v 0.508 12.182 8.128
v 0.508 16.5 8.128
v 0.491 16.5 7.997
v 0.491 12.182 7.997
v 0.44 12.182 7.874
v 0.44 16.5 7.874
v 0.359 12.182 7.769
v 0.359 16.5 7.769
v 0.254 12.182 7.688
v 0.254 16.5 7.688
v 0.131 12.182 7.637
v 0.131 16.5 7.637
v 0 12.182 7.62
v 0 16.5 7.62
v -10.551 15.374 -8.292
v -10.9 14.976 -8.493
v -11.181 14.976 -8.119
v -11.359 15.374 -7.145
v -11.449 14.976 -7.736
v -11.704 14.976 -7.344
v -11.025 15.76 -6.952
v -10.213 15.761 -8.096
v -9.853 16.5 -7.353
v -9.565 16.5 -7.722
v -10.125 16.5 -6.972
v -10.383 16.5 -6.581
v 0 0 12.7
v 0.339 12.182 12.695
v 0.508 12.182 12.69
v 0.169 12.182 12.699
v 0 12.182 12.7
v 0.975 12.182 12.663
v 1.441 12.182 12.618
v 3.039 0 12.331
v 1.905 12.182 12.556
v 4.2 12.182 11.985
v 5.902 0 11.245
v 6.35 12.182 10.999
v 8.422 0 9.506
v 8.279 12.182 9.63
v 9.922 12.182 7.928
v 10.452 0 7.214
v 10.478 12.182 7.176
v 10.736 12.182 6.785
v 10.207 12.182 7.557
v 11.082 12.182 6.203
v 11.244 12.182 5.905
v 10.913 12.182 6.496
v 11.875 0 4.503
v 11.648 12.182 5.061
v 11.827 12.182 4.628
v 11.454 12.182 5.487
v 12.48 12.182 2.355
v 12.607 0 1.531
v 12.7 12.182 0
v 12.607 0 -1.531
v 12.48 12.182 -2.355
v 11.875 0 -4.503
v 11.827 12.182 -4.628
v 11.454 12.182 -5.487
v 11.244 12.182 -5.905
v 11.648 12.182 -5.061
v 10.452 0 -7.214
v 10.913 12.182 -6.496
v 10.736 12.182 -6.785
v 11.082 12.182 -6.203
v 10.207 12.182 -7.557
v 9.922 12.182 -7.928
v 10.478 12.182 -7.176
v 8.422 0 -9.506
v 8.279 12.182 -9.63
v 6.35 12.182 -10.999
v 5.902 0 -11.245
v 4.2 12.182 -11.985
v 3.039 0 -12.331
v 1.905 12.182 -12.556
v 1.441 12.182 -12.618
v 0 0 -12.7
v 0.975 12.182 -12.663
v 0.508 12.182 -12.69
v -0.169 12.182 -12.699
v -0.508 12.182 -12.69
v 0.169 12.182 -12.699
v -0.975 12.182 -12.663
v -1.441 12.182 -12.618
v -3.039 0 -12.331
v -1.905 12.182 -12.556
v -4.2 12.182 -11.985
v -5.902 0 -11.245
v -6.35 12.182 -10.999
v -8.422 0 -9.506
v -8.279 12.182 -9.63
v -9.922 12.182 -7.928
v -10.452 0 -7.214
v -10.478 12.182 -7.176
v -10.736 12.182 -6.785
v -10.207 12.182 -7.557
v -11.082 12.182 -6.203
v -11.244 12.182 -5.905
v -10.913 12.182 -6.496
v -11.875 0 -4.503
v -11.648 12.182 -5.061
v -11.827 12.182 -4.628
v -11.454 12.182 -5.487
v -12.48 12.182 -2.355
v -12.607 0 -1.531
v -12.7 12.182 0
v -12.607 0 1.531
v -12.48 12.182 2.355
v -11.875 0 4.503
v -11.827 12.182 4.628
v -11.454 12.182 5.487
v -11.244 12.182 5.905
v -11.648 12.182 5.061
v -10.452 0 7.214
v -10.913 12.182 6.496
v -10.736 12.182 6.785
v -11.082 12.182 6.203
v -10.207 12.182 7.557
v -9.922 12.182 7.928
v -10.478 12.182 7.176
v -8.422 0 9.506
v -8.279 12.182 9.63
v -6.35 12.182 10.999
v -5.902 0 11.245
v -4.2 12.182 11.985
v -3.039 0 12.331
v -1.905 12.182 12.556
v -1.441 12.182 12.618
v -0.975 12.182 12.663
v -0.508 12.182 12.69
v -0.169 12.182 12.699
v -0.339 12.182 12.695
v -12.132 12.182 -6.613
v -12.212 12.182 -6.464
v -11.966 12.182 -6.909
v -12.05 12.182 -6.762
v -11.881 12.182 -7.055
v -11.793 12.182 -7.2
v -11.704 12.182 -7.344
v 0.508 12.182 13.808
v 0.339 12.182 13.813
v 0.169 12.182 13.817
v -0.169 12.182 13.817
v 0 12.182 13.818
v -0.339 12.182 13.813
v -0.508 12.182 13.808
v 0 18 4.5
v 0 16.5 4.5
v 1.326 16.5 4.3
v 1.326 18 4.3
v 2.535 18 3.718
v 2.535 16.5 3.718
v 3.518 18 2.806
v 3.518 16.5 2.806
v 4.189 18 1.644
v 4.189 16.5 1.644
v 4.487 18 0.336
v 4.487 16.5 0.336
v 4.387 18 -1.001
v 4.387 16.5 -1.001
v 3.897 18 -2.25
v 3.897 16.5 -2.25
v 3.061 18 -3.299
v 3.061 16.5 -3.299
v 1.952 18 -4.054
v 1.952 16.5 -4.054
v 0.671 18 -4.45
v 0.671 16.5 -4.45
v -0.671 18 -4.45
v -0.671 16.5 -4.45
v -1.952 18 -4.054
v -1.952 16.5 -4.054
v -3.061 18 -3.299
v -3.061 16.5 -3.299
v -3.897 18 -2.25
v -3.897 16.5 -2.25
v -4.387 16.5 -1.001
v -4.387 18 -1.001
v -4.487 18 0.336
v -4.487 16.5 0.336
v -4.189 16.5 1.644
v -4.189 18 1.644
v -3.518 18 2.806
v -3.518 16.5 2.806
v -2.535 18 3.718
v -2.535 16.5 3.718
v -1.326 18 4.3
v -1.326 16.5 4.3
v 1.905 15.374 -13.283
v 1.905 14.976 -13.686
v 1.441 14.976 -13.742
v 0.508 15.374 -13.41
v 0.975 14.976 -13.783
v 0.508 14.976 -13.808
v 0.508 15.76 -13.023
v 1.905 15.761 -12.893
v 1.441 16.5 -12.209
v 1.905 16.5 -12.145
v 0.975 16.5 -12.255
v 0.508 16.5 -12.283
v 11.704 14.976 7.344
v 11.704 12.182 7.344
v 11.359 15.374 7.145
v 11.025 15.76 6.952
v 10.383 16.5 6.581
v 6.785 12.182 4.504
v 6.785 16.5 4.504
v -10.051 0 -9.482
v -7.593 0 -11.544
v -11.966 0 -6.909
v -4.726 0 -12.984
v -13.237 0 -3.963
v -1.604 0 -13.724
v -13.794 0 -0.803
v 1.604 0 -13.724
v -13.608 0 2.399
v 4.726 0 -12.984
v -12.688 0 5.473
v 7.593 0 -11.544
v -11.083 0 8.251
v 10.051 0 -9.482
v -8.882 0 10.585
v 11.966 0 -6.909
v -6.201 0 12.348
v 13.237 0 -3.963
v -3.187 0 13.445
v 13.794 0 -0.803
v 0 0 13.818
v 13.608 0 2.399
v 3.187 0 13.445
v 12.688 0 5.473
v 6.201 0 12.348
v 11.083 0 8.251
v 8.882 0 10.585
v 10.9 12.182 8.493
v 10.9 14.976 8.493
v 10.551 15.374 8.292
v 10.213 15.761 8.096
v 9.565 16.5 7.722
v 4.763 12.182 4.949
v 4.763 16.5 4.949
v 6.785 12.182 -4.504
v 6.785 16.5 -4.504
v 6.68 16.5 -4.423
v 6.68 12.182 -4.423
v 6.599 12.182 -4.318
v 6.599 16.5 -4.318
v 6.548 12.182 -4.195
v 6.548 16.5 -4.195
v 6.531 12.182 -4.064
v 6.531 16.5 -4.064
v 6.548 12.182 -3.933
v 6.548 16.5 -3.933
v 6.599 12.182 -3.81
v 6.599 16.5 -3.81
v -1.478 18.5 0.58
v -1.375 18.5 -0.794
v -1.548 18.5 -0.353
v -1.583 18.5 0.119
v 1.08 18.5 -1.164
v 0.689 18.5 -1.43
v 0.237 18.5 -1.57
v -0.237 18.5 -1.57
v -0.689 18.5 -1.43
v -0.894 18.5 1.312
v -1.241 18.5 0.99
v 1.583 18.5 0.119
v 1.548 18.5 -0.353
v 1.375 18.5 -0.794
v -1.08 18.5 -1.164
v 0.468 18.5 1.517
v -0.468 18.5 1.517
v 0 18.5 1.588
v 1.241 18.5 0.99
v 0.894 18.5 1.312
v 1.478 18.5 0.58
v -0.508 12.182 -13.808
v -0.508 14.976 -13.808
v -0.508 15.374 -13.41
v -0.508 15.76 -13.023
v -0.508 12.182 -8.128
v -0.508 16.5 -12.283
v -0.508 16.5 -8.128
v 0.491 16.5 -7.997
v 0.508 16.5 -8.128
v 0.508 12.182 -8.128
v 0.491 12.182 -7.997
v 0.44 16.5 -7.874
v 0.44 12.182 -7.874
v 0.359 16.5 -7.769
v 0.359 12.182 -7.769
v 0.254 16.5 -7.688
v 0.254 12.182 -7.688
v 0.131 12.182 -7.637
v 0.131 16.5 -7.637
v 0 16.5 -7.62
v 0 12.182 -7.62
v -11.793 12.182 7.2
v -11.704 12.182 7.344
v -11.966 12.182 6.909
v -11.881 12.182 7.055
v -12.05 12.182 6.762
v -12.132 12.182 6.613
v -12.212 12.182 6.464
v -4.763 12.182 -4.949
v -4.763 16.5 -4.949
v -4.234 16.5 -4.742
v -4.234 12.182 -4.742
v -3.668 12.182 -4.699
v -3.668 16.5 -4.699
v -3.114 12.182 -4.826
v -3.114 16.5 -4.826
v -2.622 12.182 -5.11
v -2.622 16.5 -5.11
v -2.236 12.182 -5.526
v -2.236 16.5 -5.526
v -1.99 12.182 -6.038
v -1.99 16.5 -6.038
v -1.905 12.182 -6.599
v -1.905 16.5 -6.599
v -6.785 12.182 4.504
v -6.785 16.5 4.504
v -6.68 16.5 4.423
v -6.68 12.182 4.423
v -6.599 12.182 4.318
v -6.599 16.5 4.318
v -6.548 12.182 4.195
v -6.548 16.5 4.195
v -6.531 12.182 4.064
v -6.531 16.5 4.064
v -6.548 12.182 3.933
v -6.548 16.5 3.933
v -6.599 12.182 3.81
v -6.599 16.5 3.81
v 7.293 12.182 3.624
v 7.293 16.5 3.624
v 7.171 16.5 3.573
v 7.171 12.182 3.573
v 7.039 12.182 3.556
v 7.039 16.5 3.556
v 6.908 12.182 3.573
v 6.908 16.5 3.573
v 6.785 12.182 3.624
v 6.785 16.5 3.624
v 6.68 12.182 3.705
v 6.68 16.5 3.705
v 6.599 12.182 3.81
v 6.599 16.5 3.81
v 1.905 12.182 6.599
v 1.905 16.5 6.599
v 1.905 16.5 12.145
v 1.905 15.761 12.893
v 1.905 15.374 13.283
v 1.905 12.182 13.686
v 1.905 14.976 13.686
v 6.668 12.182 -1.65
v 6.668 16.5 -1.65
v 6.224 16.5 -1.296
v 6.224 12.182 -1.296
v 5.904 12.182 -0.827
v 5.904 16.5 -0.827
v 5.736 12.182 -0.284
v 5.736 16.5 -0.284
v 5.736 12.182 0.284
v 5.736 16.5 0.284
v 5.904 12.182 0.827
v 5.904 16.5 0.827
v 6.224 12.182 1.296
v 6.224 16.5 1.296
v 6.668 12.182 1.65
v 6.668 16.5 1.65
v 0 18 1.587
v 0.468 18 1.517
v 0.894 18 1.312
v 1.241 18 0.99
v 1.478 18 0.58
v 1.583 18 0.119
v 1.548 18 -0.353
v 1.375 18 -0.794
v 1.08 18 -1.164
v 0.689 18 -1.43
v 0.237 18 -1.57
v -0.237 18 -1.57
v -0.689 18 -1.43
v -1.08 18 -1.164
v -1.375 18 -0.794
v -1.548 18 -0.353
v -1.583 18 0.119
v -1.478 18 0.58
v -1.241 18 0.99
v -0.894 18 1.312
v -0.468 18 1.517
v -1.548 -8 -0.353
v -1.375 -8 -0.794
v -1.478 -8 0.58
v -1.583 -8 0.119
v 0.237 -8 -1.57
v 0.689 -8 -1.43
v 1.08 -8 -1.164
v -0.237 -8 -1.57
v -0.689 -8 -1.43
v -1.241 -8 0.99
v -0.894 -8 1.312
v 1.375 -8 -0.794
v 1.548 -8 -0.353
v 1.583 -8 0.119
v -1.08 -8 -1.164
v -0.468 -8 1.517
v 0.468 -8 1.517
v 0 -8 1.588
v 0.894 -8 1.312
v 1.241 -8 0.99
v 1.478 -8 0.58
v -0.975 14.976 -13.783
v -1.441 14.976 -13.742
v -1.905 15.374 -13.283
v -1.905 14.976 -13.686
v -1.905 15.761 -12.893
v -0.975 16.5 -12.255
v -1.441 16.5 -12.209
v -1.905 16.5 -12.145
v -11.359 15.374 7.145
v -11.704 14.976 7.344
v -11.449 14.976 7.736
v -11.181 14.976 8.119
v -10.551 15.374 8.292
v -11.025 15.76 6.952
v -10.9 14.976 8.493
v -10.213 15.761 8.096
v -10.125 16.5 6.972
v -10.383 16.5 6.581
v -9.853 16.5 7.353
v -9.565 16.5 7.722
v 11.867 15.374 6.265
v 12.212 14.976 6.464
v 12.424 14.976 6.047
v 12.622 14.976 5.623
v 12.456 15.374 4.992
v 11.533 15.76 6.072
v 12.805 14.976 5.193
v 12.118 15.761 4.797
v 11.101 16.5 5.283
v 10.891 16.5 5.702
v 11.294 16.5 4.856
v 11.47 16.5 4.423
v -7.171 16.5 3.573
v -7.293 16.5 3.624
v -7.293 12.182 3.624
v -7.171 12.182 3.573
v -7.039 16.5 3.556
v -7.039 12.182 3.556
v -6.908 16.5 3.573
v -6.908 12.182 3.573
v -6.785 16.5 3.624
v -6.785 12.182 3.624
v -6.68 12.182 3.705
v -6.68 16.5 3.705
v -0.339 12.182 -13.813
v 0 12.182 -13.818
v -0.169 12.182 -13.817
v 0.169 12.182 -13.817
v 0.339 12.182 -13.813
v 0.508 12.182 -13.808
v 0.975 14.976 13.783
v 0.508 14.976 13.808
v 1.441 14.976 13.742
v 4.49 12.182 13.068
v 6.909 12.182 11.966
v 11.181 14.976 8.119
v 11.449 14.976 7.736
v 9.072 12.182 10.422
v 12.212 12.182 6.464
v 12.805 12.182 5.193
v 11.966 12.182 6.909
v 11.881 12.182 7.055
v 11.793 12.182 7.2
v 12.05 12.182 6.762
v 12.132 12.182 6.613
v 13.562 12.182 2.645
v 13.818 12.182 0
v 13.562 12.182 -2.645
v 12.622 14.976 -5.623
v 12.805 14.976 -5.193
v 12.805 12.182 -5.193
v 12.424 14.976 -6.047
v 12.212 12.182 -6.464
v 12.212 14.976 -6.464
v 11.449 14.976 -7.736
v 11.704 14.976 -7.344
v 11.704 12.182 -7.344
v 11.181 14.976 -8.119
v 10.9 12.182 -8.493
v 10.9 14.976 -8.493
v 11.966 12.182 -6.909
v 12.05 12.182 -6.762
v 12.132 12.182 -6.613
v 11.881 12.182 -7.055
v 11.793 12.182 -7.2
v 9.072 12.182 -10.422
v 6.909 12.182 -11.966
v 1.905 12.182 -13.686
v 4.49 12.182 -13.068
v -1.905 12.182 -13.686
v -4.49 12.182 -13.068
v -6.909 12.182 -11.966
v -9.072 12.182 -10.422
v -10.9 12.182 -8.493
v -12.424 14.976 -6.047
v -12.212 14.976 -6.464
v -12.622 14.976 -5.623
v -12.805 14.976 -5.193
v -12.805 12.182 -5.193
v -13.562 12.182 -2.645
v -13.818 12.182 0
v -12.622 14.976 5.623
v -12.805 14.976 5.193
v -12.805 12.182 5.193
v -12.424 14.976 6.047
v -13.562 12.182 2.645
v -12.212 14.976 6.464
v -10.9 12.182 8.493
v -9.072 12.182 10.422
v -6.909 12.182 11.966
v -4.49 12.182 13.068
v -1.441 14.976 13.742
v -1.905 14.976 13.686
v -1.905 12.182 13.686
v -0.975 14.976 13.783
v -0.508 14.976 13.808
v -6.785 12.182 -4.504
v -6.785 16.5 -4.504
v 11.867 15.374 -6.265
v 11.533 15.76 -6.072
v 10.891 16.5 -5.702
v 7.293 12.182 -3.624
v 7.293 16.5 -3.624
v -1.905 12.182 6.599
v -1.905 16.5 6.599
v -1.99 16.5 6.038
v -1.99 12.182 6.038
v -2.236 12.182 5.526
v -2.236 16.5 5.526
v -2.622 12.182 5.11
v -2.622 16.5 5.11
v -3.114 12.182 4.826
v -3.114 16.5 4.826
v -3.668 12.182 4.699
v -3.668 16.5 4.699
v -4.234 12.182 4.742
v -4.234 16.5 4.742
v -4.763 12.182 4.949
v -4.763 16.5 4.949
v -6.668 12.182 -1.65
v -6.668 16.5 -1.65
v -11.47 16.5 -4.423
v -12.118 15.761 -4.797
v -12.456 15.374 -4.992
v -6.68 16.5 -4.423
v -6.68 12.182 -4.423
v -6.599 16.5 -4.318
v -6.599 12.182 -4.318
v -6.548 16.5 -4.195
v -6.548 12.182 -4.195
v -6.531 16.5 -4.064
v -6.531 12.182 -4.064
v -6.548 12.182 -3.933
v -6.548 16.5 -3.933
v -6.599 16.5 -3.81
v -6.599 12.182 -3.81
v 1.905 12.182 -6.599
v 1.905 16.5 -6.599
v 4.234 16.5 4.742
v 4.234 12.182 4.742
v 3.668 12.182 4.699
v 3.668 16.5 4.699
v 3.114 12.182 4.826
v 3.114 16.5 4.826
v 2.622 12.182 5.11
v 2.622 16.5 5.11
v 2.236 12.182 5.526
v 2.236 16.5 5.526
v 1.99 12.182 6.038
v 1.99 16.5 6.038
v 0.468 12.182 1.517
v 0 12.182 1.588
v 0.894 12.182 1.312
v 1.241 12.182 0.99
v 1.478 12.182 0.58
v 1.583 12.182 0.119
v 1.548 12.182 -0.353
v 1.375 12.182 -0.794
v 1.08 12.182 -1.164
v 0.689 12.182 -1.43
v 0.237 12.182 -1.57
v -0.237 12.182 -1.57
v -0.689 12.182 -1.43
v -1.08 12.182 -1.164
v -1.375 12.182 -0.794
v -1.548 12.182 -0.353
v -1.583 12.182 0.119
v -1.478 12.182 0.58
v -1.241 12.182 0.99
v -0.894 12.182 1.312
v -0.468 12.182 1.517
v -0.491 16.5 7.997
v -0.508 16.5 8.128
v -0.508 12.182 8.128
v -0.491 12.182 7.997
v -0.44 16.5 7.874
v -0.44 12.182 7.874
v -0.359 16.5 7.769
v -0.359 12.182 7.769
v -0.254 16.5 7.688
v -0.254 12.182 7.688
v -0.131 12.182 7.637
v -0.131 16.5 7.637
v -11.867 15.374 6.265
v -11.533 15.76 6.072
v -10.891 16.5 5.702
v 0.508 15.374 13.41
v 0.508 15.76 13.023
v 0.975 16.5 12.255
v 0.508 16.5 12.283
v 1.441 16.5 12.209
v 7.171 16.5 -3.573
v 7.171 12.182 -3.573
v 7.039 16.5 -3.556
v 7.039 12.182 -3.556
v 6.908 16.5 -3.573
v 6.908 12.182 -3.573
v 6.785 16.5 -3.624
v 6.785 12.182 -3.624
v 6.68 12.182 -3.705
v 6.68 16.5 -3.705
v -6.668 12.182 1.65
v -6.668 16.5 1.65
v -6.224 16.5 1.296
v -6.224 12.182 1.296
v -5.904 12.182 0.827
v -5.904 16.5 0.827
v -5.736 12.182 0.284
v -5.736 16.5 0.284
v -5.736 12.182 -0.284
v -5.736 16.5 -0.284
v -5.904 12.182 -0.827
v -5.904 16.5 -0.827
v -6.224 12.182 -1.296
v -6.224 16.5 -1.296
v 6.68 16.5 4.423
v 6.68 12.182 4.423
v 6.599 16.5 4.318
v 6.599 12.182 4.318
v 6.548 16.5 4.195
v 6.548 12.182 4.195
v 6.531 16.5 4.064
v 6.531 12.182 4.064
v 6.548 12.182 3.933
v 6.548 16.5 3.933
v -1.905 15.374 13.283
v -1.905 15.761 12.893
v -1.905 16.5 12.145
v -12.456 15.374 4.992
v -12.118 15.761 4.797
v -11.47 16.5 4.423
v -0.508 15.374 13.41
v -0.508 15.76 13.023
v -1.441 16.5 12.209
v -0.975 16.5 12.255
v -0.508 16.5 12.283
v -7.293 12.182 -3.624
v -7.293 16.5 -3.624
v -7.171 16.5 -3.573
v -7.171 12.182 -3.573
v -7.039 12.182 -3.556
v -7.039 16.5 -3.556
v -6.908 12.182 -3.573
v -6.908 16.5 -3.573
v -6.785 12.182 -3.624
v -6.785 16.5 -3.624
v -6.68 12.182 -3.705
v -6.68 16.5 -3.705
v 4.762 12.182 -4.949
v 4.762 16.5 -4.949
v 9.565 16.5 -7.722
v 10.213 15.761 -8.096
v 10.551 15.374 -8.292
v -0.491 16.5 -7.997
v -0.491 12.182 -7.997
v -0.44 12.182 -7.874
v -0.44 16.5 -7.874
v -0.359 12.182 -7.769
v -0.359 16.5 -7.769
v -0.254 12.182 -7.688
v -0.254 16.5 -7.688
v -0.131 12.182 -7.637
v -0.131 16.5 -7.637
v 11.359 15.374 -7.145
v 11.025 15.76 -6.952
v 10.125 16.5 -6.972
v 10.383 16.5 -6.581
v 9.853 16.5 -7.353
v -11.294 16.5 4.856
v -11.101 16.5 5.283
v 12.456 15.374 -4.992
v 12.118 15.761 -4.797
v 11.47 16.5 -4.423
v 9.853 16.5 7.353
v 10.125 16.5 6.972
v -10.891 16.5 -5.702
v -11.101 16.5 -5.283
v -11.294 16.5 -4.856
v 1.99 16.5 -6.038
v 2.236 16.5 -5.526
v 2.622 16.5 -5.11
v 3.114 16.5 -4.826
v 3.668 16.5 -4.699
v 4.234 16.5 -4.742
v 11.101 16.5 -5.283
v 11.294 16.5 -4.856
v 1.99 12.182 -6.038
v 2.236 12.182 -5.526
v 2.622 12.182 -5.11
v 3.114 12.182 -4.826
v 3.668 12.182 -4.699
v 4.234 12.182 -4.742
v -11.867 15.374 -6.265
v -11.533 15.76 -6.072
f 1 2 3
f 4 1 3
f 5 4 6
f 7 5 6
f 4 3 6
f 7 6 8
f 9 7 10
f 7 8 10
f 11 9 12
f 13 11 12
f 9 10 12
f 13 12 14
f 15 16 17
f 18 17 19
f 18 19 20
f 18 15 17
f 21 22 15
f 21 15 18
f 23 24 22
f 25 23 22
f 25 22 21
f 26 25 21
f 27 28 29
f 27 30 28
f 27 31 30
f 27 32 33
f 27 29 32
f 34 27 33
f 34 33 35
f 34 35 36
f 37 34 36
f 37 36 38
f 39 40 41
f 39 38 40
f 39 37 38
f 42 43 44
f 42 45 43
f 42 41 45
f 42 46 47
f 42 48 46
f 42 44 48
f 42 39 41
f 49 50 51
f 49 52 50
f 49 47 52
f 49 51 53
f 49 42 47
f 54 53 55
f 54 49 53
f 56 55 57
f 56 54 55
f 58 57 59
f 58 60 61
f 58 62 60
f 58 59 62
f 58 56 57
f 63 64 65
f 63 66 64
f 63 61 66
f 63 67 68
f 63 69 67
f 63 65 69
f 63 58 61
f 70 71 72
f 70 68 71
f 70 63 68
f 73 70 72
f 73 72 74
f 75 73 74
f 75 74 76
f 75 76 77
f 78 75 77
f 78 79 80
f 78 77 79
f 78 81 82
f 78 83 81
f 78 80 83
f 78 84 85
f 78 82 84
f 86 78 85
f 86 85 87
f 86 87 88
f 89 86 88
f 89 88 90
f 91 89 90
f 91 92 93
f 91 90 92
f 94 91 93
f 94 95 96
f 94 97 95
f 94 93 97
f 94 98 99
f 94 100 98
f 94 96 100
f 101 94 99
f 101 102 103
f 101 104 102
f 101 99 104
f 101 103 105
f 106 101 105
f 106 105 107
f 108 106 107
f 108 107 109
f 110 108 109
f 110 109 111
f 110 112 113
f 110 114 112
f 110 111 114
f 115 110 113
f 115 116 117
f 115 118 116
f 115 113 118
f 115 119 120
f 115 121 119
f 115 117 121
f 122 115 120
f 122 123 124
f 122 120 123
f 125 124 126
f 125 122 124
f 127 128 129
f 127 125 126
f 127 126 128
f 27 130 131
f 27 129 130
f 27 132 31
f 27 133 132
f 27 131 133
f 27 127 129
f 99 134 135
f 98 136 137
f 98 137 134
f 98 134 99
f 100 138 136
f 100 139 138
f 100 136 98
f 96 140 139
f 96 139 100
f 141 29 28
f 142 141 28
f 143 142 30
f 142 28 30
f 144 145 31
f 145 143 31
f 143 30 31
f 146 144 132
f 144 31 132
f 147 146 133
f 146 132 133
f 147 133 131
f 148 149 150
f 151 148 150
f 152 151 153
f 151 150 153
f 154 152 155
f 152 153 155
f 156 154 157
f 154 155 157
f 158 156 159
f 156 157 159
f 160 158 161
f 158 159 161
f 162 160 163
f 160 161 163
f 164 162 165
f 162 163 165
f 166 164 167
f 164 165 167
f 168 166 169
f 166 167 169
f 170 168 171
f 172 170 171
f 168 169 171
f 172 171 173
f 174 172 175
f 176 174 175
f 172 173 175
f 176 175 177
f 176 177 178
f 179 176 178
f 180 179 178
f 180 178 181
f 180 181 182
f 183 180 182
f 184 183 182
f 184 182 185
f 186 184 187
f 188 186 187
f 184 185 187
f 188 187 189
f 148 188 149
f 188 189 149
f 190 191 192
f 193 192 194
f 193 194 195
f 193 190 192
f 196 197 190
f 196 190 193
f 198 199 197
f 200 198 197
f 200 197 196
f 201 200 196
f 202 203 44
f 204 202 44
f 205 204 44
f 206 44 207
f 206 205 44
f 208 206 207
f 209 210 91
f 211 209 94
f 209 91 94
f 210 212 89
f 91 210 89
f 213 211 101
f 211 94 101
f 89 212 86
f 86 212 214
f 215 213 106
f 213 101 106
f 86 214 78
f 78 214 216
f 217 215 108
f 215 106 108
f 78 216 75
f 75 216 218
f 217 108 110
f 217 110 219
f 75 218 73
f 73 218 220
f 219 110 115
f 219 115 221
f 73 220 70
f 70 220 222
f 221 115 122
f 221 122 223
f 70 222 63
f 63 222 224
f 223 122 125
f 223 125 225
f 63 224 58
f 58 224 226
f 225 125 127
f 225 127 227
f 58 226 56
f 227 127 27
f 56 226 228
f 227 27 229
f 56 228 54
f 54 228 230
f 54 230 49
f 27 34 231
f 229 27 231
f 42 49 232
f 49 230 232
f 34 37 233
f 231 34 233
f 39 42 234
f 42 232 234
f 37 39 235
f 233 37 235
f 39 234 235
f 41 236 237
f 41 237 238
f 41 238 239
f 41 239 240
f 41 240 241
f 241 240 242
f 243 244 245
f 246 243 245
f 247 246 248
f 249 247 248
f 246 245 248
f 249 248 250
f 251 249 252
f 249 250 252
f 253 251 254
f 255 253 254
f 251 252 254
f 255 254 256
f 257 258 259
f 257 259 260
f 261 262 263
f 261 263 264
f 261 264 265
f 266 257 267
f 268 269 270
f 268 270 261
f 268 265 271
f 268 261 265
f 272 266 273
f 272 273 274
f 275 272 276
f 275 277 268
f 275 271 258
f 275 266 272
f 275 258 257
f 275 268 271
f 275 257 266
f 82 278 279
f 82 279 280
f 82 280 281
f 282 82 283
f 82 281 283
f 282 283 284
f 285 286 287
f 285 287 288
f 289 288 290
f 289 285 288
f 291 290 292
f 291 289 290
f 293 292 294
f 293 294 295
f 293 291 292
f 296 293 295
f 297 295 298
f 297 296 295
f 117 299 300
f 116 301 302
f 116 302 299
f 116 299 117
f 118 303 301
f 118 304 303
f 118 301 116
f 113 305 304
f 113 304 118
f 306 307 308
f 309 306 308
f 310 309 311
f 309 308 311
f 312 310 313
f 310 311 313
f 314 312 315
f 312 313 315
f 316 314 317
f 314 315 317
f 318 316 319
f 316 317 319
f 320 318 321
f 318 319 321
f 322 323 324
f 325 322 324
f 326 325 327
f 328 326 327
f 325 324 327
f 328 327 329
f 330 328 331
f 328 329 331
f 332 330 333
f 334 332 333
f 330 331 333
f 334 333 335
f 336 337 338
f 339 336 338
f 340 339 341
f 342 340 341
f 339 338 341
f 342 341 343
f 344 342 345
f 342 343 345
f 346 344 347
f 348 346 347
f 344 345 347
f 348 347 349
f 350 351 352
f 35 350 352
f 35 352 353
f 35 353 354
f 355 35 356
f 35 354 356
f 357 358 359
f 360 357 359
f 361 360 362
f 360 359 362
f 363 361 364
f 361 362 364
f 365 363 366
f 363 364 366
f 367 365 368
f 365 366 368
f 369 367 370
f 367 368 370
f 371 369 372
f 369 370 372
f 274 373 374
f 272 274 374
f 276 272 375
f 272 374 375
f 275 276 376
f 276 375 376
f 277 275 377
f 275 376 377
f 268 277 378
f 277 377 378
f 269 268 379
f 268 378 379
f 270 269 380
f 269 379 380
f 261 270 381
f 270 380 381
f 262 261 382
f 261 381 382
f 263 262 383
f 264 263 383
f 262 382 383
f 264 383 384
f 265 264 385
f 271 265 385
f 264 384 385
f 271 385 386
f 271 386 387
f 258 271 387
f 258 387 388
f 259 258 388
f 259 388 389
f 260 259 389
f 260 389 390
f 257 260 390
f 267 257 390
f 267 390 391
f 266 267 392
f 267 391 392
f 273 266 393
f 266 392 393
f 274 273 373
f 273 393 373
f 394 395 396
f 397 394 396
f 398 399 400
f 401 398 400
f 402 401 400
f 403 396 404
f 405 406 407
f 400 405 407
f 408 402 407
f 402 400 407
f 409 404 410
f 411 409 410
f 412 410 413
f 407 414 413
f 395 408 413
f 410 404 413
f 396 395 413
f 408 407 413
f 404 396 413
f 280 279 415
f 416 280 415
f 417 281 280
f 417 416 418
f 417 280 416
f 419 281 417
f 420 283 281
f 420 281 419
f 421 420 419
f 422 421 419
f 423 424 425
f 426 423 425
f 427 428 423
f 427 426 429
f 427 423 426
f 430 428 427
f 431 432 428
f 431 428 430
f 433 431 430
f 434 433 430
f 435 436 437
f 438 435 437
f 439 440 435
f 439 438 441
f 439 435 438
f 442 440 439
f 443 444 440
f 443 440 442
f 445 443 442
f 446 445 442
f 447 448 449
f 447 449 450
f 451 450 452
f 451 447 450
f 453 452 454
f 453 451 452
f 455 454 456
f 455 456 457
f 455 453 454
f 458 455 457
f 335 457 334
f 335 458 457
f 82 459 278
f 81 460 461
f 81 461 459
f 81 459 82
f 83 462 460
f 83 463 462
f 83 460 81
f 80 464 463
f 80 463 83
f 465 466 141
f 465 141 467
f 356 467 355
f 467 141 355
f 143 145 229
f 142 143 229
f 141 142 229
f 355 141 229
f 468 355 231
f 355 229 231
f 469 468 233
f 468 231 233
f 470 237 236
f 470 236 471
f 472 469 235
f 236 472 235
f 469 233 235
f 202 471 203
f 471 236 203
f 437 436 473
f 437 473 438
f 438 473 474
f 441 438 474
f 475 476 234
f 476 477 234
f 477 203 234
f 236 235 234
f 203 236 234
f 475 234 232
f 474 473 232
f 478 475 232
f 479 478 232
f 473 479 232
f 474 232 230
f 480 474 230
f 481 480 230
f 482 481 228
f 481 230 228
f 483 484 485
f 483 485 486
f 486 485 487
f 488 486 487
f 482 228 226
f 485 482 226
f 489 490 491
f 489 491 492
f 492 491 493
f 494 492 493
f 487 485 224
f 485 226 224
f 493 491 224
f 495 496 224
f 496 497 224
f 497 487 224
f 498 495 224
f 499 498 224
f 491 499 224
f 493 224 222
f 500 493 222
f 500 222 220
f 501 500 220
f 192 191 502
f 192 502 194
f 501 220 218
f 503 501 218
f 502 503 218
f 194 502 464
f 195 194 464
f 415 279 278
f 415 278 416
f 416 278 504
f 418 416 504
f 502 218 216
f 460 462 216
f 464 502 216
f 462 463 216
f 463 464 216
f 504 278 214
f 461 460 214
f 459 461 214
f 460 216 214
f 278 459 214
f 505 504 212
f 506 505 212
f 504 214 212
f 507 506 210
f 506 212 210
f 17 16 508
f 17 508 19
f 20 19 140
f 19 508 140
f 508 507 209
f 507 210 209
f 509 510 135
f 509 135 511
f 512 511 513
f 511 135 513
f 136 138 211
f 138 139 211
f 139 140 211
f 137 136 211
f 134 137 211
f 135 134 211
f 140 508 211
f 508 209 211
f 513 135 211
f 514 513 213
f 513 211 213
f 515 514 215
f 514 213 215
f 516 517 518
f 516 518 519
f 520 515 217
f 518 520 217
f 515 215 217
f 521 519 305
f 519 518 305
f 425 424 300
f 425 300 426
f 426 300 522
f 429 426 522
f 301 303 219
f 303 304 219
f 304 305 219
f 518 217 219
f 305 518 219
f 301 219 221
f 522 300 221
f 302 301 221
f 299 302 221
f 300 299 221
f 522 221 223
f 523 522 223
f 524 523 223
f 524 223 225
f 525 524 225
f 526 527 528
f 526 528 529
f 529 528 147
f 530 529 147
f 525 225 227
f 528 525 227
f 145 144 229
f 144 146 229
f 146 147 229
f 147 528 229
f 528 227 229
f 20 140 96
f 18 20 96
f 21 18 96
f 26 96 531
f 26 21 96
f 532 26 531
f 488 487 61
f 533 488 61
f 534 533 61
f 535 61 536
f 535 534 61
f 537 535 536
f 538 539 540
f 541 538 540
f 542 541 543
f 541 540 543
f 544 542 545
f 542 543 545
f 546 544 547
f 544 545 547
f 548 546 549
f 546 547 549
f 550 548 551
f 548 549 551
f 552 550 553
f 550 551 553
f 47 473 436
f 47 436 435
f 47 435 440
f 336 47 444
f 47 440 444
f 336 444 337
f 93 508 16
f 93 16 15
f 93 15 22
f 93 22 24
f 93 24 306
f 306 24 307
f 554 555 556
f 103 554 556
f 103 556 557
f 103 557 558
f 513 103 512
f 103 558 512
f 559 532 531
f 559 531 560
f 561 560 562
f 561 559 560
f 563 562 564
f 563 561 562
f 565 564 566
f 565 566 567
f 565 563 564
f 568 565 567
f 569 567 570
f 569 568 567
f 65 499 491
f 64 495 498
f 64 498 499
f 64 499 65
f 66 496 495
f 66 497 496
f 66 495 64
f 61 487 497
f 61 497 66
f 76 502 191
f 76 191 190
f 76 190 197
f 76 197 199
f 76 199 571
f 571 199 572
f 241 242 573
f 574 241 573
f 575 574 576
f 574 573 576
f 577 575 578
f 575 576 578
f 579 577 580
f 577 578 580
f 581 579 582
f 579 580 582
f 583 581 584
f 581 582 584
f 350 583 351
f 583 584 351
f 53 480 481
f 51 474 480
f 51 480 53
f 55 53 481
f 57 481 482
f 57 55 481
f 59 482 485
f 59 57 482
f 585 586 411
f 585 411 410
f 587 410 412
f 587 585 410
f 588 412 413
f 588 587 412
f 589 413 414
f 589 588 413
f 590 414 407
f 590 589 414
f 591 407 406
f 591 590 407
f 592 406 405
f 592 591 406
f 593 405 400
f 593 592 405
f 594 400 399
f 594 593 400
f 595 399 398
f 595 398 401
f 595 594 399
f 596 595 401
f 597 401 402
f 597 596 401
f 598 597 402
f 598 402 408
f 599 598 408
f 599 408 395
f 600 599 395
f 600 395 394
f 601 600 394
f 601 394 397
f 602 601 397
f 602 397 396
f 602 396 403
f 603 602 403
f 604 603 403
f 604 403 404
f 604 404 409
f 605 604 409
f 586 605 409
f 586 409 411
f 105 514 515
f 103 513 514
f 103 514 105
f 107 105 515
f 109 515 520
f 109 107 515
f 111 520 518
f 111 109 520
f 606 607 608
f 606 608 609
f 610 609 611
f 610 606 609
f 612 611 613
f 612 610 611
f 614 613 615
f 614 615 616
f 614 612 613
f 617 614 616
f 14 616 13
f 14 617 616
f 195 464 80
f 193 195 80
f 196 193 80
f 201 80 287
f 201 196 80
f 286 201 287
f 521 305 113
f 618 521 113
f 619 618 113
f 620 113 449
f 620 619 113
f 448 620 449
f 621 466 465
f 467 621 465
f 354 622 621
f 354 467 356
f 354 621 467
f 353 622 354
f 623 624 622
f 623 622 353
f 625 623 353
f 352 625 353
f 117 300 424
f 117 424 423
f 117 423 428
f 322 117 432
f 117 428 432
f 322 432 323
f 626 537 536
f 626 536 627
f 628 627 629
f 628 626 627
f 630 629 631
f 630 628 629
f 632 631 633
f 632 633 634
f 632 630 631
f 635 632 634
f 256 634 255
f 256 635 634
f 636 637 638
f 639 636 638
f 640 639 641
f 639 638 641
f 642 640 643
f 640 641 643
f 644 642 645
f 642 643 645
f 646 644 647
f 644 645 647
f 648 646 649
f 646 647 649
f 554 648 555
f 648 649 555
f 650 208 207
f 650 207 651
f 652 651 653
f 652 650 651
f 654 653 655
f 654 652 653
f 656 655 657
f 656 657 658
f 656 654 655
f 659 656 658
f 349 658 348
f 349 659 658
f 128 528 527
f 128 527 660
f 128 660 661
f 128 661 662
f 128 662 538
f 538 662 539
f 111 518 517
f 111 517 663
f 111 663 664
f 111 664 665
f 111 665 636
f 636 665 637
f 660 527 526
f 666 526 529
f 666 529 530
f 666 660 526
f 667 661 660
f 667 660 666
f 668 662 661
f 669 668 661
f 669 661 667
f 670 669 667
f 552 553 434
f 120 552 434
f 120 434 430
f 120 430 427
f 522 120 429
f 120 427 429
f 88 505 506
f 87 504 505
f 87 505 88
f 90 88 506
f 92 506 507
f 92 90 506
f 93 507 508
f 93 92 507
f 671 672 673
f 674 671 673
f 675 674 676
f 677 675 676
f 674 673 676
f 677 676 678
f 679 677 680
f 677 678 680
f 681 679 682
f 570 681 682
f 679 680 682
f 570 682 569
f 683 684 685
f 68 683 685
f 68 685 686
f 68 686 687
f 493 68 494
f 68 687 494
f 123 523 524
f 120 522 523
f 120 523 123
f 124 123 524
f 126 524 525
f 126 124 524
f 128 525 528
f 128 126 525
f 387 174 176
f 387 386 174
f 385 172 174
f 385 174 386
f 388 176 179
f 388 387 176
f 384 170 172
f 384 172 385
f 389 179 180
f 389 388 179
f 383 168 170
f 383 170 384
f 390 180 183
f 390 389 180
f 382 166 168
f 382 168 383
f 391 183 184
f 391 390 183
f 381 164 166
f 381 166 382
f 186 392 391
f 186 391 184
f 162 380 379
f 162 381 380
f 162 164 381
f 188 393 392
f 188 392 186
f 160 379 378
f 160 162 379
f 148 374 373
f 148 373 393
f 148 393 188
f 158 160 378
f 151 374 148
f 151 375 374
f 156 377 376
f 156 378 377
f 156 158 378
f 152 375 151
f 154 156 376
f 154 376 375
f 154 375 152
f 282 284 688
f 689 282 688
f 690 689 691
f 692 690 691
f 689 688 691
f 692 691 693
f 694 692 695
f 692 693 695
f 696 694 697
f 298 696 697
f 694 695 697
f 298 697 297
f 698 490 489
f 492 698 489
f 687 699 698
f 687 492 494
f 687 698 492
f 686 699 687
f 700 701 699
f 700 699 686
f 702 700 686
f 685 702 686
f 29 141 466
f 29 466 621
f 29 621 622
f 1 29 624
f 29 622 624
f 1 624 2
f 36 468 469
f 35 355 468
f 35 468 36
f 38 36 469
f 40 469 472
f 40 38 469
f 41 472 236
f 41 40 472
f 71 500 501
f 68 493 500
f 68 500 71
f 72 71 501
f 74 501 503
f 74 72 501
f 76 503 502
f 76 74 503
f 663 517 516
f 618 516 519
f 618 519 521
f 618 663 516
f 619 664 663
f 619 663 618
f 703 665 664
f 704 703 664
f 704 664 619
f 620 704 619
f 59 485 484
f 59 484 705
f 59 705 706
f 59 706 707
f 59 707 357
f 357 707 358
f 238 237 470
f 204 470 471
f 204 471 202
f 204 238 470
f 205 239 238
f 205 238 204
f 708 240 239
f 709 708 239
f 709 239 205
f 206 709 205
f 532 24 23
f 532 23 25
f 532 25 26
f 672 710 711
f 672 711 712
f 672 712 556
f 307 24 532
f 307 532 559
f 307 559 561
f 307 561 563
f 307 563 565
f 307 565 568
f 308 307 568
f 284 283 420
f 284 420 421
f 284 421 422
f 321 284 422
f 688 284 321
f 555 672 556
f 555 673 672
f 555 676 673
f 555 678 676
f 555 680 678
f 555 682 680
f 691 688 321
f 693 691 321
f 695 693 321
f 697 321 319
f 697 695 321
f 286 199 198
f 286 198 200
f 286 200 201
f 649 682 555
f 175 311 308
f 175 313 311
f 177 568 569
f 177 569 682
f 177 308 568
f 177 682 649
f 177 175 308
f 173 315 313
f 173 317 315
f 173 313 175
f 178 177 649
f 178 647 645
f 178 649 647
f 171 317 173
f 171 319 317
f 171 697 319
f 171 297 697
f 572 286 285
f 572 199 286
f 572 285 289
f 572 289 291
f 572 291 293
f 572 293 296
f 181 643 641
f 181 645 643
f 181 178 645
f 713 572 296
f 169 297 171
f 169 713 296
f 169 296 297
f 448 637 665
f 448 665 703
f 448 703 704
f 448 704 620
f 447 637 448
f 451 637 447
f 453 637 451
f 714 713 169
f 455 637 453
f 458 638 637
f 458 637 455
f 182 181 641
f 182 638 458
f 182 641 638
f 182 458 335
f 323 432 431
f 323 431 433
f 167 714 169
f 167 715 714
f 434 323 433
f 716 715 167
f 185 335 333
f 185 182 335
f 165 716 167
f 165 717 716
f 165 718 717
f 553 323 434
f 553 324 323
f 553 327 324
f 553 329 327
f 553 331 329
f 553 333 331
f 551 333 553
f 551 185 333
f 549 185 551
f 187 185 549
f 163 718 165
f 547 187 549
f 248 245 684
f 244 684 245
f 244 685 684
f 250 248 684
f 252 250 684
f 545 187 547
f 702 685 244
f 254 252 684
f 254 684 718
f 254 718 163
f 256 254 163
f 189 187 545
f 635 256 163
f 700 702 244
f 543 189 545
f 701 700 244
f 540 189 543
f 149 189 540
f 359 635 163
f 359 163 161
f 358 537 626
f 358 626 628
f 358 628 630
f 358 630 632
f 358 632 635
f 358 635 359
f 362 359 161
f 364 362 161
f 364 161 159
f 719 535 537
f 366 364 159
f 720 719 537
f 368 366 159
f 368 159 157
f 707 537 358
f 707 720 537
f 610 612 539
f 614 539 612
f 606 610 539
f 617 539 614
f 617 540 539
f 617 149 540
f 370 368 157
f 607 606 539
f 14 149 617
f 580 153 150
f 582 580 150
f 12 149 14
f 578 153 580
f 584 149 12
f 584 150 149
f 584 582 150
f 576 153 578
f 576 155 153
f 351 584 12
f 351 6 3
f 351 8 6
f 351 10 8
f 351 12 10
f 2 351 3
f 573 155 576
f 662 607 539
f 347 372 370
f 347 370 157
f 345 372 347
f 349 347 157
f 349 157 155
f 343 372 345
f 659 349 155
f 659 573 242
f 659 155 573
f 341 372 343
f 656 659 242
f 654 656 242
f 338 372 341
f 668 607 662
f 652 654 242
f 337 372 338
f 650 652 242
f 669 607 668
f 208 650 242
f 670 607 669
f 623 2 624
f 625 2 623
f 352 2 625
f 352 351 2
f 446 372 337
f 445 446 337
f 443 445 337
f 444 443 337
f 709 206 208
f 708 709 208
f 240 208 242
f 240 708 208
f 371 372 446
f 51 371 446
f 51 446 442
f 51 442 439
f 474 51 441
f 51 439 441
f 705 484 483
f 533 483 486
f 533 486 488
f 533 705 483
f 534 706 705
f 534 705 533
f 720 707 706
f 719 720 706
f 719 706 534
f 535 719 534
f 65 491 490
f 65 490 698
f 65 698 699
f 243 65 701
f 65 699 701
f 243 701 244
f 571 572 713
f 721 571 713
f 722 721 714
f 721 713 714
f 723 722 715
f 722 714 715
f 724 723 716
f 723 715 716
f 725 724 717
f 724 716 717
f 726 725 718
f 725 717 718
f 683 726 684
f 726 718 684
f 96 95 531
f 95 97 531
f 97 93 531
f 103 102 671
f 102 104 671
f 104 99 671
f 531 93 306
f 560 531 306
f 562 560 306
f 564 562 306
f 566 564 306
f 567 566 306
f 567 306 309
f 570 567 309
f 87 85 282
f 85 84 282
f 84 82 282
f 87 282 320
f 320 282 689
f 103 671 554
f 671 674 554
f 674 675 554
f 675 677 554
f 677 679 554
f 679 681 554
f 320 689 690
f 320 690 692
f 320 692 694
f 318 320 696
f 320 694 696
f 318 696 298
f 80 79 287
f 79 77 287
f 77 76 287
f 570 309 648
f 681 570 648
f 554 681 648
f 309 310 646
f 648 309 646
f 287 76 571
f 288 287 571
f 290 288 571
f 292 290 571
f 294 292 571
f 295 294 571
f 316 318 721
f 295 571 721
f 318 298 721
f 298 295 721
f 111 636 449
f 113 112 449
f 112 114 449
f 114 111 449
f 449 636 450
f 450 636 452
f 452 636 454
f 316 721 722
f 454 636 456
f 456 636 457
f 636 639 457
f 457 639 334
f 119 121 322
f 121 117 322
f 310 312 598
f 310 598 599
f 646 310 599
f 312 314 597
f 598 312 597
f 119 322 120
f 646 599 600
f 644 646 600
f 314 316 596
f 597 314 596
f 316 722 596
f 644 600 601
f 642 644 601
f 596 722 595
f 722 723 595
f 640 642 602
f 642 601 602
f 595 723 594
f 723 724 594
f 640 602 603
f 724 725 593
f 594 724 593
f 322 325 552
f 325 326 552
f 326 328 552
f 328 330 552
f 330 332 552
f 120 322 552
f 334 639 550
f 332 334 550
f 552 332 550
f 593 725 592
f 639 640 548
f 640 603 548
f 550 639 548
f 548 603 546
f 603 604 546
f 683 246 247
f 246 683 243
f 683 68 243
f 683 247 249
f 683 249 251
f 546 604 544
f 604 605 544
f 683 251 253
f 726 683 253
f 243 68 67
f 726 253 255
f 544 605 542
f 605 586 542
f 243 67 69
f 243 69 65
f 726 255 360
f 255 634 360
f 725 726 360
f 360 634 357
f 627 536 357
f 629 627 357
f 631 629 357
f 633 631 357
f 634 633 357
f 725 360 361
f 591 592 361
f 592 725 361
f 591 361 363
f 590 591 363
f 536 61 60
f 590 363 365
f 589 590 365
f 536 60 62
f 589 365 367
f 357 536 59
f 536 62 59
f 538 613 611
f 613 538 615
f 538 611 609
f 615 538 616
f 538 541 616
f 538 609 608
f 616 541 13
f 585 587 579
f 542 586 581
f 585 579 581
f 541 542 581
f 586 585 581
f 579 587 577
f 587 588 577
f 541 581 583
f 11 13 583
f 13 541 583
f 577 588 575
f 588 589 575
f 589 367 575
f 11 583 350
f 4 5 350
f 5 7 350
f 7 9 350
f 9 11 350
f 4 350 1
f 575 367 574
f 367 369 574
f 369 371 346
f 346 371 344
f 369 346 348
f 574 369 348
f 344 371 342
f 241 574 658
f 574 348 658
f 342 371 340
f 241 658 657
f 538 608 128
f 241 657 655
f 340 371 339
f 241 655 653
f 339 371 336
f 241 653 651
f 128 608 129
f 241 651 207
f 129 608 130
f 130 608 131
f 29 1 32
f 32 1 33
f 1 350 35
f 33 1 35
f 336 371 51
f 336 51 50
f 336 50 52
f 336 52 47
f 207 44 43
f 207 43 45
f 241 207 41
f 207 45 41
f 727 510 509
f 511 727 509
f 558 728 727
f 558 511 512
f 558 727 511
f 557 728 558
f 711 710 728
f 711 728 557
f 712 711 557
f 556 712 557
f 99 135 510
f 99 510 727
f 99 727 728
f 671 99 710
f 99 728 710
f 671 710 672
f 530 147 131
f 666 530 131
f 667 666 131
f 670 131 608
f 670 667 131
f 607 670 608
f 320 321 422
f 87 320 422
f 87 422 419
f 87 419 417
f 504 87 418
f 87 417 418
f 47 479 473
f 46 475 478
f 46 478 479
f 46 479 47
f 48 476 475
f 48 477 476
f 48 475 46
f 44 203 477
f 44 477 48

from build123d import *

# Parameters (mm, degrees)
SKETCH1_R                = 13.8176
SKETCH1_R_2              = 12.7
BOSS_EXTRUDE1_DEPTH      = 16.5
SKETCH2_R                = 13.8176
BOSS_EXTRUDE2_DEPTH      = 4.318
CUT_EXTRUDE1_DEPTH       = 4.318
CIRPATTERN1_COUNT        = 6
CHAMFER1_SIZE            = 1.524
SKETCH4_R                = 4.5
BOSS_EXTRUDE3_DEPTH      = 1.5
SKETCH5_R                = 1.5875
BOSS_EXTRUDE4_DEPTH      = 0.5
BOSS_EXTRUDE4_DEPTH_BACK = 26


with BuildPart() as part:
    # Sketch1 → Boss-Extrude1 (new body)
    with BuildSketch(Plane(origin=(0, 0, 0), x_dir=(1, 0, 0), z_dir=(0, 1, 0))):
        with Locations(Location((0, 0, 0), (0, 0, 270))):  # turned: the seam where the file's is
            Circle(SKETCH1_R)
        with Locations(Location((0, 0, 0), (0, 0, 270))):  # turned: the seam where the file's is
            Circle(SKETCH1_R_2, mode=Mode.SUBTRACT)
    extrude(amount=BOSS_EXTRUDE1_DEPTH)

    # Sketch2 → Boss-Extrude2 (add)
    with BuildSketch(Plane(origin=(0, 16.5, 0), x_dir=(-1, 0, 0), z_dir=(0, 1, 0))):
        with Locations(Location((0, 0, 0), (0, 0, 90))):  # turned: the seam where the file's is
            Circle(SKETCH2_R)
    extrude(amount=-BOSS_EXTRUDE2_DEPTH)

    # Sketch3 → Cut-Extrude1 (cut)
    with BuildSketch(Plane(origin=(0, 16.5, 0), x_dir=(-1, 0, 0), z_dir=(0, 1, 0))):
        with BuildLine():
            Line((-1.905, -13.685651054), (-1.905, -6.599113577))
            ThreePointArc((-1.905, -6.599113577), (-2.8575, -4.949335183), (-4.7625, -4.949335183))
            Line((-4.7625, -4.949335183), (-10.89962148, -8.492603921))
            ThreePointArc((-10.89962148, -8.492603921), (-6.9088, -11.966392619), (-1.905, -13.685651054))
        make_face()
        with BuildLine():
            Line((-0.508, -13.808258607), (-0.508, -8.128))
            ThreePointArc((-0.508, -8.128), (-0.359210245, -7.768789755), (0, -7.62))
            Line((0, -7.62), (0, -13.8176))
            ThreePointArc((0, -13.8176), (-0.25404294, -13.815264454), (-0.508, -13.808258607))
        make_face()
        with BuildLine():
            Line((-11.704302736, -7.344070209), (-6.785054482, -4.503940905))
            ThreePointArc((-6.785054482, -4.503940905), (-6.548364162, -4.195480075), (-6.599113577, -3.81))
            Line((-6.599113577, -3.81), (-11.966392619, -6.9088))
            ThreePointArc((-11.966392619, -6.9088), (-11.837348507, -7.127639867), (-11.704302736, -7.344070209))
        make_face()
    cut_extrude1 = extrude(amount=-CUT_EXTRUDE1_DEPTH, mode=Mode.SUBTRACT)

    # CirPattern1: Cut-Extrude1 ×6 about axis
    cirpattern1_axis = Axis((0, 0, 0), (0, 1, 0))
    for i in range(1, CIRPATTERN1_COUNT):
        add(cut_extrude1.rotate(cirpattern1_axis, i * 360 / CIRPATTERN1_COUNT), mode=Mode.SUBTRACT)

    # Chamfer1
    chamfer1_edges = [part.edges().sort_by_distance(p)[0] for p in [
        (-12.524598769, 16.5, 5.83613703),
        (-11.316542312, 16.5, 7.928552191),
        (-1.208056457, 16.5, 13.764689221),
        (1.208056457, 16.5, 13.764689221),
        (1.208056457, 16.5, -13.764689221),
        (11.316542312, 16.5, 7.928552191),
        (12.524598769, 16.5, 5.83613703),
        (12.524598769, 16.5, -5.83613703),
        (11.316542312, 16.5, -7.928552191),
        (-11.316542312, 16.5, -7.928552191),
        (-12.524598769, 16.5, -5.83613703),
        (-1.208056457, 16.5, -13.764689221),
    ]]
    chamfer(chamfer1_edges, length=CHAMFER1_SIZE)

    # Sketch4 → Boss-Extrude3 (add)
    with BuildSketch(Plane(origin=(0, 16.5, 0), x_dir=(-1, 0, 0), z_dir=(0, 1, 0))):
        with Locations(Location((0, 0, 0), (0, 0, 90))):  # turned: the seam where the file's is
            Circle(SKETCH4_R)
    extrude(amount=BOSS_EXTRUDE3_DEPTH)

    # Sketch5 → Boss-Extrude4 (add, two sides)
    with BuildSketch(Plane(origin=(0, 18, 0), x_dir=(-1, 0, 0), z_dir=(0, 1, 0))) as boss_extrude4_sk:
        with Locations(Location((0, 0, 0), (0, 0, 90))):  # turned: the seam where the file's is
            Circle(SKETCH5_R)
    extrude(amount=BOSS_EXTRUDE4_DEPTH)
    extrude(boss_extrude4_sk.sketch, amount=-BOSS_EXTRUDE4_DEPTH_BACK)


solid = part.part
